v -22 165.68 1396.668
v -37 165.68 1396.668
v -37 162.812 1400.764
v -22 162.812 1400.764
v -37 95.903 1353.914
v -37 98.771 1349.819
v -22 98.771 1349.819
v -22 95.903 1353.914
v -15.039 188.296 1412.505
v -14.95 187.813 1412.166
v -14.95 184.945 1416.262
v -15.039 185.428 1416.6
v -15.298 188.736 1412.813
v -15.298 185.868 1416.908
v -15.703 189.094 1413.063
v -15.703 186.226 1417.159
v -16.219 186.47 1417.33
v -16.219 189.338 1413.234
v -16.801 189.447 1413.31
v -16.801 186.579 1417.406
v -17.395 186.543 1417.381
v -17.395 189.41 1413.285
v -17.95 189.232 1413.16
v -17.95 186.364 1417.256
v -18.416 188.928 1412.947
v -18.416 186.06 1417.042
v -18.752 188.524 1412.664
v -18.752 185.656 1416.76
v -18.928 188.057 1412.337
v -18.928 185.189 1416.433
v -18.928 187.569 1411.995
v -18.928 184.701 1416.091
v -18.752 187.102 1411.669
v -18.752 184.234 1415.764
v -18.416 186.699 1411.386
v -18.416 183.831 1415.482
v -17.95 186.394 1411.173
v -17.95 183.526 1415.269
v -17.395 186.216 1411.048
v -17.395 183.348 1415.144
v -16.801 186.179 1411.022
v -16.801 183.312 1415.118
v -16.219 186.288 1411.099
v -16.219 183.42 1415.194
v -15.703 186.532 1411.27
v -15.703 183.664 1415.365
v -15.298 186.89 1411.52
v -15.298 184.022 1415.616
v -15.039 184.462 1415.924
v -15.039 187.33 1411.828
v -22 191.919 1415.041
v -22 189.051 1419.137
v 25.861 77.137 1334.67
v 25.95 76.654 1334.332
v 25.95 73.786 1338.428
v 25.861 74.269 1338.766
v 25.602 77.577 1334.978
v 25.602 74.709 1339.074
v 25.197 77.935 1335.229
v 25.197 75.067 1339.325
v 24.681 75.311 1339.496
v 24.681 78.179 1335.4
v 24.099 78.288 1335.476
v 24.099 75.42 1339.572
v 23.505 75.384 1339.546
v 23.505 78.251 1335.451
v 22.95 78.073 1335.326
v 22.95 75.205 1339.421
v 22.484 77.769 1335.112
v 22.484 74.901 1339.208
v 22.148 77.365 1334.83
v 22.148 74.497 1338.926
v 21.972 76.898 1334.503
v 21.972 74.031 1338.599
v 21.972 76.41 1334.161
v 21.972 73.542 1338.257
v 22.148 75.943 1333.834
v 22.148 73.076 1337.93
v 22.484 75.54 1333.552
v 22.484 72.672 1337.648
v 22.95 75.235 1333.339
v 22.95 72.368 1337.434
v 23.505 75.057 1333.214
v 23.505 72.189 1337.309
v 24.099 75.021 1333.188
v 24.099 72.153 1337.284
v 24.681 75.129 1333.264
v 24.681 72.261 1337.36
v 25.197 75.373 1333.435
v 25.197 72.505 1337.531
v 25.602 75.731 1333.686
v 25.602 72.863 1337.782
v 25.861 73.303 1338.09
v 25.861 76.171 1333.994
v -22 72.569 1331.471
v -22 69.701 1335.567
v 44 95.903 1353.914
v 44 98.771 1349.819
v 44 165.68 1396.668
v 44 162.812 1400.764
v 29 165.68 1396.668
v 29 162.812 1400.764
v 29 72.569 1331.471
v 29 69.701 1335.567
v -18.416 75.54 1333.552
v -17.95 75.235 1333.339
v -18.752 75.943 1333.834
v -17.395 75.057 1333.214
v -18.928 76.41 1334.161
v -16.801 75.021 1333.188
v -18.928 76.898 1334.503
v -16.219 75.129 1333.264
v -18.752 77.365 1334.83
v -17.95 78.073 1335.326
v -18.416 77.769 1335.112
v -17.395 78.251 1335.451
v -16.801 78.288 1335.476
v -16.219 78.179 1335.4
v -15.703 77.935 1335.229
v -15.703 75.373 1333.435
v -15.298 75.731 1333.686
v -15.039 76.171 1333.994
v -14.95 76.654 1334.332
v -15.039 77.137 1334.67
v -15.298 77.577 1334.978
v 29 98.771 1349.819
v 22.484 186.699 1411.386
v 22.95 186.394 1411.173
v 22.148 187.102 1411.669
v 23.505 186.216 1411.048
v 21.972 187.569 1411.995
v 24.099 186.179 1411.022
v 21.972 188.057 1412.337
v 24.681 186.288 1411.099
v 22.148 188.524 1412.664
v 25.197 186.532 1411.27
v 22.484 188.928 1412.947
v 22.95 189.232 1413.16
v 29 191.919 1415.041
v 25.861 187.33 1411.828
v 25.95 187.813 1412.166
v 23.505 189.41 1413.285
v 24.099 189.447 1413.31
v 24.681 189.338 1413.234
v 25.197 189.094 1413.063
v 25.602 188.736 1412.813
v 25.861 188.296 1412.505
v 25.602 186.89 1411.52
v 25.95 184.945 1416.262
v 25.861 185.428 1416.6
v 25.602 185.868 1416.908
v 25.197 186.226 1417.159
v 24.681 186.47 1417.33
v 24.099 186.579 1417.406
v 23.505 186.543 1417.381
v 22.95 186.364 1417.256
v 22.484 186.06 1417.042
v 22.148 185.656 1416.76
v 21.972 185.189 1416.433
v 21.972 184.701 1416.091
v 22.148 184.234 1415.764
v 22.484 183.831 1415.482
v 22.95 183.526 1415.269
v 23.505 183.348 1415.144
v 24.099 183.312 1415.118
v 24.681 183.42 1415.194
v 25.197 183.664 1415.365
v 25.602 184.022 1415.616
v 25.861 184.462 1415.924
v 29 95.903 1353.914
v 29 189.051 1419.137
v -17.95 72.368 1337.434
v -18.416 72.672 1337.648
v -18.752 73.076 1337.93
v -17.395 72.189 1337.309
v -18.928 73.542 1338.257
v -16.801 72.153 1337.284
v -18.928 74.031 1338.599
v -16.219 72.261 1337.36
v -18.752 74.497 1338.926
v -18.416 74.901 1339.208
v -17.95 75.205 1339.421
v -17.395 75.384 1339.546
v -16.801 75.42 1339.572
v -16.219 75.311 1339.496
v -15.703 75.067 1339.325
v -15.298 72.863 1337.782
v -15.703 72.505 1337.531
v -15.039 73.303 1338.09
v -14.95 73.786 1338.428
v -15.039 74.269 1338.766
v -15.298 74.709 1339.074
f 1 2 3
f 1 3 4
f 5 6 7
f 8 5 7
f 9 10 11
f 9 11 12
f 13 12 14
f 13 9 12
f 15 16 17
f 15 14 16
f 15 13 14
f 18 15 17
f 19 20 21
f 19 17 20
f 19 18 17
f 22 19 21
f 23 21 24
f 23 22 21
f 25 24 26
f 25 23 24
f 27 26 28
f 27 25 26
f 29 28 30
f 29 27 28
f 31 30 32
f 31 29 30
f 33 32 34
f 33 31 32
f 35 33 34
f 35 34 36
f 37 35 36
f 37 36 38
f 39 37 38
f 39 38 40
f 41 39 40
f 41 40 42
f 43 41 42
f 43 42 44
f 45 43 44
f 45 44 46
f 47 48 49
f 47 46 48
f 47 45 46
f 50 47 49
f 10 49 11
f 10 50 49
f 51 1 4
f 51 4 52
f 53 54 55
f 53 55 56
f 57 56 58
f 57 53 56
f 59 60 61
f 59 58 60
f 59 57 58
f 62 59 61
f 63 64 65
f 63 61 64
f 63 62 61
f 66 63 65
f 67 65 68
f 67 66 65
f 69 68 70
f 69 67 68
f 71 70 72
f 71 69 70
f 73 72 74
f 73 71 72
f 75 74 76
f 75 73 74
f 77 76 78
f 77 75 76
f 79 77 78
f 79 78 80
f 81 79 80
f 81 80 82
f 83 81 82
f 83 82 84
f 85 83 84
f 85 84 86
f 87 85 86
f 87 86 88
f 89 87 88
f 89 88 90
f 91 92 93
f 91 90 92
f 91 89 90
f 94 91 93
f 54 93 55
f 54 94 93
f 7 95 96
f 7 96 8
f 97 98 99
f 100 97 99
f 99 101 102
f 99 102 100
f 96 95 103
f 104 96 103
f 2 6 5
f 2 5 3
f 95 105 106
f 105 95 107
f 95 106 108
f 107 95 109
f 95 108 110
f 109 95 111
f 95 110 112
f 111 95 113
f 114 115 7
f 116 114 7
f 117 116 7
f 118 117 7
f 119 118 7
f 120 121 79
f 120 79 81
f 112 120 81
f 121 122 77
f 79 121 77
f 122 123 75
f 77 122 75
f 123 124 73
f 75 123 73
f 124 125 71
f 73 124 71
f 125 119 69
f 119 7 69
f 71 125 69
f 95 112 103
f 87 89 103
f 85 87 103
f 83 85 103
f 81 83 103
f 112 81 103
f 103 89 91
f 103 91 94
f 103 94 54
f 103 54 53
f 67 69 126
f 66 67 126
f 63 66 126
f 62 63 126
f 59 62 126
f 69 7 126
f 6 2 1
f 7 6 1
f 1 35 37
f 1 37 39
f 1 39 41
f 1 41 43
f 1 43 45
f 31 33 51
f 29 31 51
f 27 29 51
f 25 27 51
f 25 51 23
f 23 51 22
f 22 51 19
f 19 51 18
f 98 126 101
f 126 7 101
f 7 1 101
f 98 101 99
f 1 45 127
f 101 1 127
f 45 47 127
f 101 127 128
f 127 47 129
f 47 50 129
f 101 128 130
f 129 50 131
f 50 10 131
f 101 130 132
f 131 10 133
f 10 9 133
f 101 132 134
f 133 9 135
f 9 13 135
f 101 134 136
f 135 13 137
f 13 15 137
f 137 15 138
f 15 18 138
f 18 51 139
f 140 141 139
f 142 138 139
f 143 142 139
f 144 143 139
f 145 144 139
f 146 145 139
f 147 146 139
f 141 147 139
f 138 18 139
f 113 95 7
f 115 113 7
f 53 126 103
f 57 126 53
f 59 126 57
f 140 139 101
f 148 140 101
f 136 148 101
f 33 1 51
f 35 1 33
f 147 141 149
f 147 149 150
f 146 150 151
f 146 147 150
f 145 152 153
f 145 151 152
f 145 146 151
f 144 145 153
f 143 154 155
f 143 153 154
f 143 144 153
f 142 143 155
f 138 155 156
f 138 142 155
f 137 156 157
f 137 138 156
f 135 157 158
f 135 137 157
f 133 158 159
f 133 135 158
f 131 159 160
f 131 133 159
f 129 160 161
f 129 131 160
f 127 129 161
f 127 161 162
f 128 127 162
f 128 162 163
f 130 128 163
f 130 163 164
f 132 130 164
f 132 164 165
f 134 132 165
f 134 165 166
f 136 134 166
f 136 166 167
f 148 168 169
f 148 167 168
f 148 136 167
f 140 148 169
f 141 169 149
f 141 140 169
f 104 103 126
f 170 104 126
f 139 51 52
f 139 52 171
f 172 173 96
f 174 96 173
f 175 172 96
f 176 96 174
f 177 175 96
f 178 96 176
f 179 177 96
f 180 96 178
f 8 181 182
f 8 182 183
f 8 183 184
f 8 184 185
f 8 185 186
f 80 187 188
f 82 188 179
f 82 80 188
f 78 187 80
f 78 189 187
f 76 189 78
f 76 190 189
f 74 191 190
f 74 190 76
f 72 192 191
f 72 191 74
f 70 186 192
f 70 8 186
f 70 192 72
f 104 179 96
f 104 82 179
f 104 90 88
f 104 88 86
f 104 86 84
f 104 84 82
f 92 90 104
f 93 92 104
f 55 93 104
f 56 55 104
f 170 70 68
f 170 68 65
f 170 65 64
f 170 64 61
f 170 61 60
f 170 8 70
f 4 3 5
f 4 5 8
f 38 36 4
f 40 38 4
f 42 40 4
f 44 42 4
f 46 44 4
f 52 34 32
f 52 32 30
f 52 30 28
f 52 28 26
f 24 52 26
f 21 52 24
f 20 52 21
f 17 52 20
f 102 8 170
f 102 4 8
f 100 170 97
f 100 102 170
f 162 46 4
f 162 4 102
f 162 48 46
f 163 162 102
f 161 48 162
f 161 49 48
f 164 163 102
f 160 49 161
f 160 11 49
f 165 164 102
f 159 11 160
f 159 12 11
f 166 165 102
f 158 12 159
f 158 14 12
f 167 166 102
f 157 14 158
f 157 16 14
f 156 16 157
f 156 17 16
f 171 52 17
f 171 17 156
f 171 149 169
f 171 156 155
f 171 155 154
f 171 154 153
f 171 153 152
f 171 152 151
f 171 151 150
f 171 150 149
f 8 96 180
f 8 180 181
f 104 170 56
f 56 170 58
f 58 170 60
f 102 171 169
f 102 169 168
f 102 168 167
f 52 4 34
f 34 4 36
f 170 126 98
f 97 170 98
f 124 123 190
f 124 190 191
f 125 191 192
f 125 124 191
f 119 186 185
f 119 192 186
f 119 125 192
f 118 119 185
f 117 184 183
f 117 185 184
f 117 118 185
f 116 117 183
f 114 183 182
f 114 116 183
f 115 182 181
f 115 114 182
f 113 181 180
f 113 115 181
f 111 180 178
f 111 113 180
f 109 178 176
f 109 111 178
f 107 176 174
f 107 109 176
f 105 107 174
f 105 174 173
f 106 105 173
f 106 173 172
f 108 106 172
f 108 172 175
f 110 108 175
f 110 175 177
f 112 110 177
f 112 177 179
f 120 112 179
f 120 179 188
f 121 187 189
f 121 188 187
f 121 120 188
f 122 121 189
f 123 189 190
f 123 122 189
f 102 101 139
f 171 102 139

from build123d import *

# Parameters (mm, degrees)
CYLINDER083_R     = 2
CYLINDER083_DEPTH = 10
ARRAY001_X_COUNT  = 2
ARRAY001_X_PITCH  = 40.9
ARRAY001_Y_COUNT  = 2
ARRAY001_Y_PITCH  = 135.7
BOX080_W          = 51
BOX080_H          = 145.7
BOX080_DEPTH      = 5
BOX079_W          = 81
BOX079_H          = 81.68
BOX079_DEPTH      = 5
CUT086_ROLL_ANGLE = 35


with BuildPart() as array001:
    # Cylinder083 → Cylinder083 (new body)
    with BuildSketch(Plane(origin=(20.55, -5, 0), x_dir=(1, 0, 0), z_dir=(0, 0, 1))):
        Circle(CYLINDER083_R)
    extrude(amount=CYLINDER083_DEPTH)

    # Array001 X: Array001 ×2


with BuildPart() as array001_1:
    add(array001.part)
    with Locations(*[(i * ARRAY001_X_PITCH, 0, 0) for i in range(1, ARRAY001_X_COUNT)]):
        add(array001.part)

    # Array001 Y: Array001 ×2


with BuildPart() as array001_2:
    add(array001_1.part)
    with Locations(*[(0, i * ARRAY001_Y_PITCH, 0) for i in range(1, ARRAY001_Y_COUNT)]):
        add(array001_1.part)


with BuildPart() as array001_3:
    # Array001 placement: moved
    add(array001_2.part.moved(Location((0, 0, -2))))


with BuildPart() as cube028:
    # Box080 → Box080 (new body)
    with BuildSketch(Plane(origin=(15.5, -9.9875, 0), x_dir=(1, 0, 0), z_dir=(0, 0, 1))):
        with Locations((25.5, 72.85)):
            Rectangle(BOX080_W, BOX080_H)
    extrude(amount=BOX080_DEPTH)


with BuildPart() as tablet_holder_plate:
    # Box079 → Box079 (new body)
    with BuildSketch(Plane(origin=(0.5, 22, 0), x_dir=(1, 0, 0), z_dir=(0, 0, 1))):
        with Locations((40.5, 40.84)):
            Rectangle(BOX079_W, BOX079_H)
    extrude(amount=BOX079_DEPTH)

    # Fusion138: union Cube028
    add(cube028.part)

    # Cut086: cut Array001
    add(array001_3.part, mode=Mode.SUBTRACT)


with BuildPart() as tablet_holder_plate_1:
    # Cut086 roll: moved
    add(tablet_holder_plate.part.rotate(Axis((0, 0, 0), (1, 0, 0)), CUT086_ROLL_ANGLE))


with BuildPart() as tablet_holder_plate_2:
    # Cut086 placement: moved
    add(tablet_holder_plate_1.part.moved(Location((-37.5, 80.75, 1337.2))))


solid = tablet_holder_plate_2.part
